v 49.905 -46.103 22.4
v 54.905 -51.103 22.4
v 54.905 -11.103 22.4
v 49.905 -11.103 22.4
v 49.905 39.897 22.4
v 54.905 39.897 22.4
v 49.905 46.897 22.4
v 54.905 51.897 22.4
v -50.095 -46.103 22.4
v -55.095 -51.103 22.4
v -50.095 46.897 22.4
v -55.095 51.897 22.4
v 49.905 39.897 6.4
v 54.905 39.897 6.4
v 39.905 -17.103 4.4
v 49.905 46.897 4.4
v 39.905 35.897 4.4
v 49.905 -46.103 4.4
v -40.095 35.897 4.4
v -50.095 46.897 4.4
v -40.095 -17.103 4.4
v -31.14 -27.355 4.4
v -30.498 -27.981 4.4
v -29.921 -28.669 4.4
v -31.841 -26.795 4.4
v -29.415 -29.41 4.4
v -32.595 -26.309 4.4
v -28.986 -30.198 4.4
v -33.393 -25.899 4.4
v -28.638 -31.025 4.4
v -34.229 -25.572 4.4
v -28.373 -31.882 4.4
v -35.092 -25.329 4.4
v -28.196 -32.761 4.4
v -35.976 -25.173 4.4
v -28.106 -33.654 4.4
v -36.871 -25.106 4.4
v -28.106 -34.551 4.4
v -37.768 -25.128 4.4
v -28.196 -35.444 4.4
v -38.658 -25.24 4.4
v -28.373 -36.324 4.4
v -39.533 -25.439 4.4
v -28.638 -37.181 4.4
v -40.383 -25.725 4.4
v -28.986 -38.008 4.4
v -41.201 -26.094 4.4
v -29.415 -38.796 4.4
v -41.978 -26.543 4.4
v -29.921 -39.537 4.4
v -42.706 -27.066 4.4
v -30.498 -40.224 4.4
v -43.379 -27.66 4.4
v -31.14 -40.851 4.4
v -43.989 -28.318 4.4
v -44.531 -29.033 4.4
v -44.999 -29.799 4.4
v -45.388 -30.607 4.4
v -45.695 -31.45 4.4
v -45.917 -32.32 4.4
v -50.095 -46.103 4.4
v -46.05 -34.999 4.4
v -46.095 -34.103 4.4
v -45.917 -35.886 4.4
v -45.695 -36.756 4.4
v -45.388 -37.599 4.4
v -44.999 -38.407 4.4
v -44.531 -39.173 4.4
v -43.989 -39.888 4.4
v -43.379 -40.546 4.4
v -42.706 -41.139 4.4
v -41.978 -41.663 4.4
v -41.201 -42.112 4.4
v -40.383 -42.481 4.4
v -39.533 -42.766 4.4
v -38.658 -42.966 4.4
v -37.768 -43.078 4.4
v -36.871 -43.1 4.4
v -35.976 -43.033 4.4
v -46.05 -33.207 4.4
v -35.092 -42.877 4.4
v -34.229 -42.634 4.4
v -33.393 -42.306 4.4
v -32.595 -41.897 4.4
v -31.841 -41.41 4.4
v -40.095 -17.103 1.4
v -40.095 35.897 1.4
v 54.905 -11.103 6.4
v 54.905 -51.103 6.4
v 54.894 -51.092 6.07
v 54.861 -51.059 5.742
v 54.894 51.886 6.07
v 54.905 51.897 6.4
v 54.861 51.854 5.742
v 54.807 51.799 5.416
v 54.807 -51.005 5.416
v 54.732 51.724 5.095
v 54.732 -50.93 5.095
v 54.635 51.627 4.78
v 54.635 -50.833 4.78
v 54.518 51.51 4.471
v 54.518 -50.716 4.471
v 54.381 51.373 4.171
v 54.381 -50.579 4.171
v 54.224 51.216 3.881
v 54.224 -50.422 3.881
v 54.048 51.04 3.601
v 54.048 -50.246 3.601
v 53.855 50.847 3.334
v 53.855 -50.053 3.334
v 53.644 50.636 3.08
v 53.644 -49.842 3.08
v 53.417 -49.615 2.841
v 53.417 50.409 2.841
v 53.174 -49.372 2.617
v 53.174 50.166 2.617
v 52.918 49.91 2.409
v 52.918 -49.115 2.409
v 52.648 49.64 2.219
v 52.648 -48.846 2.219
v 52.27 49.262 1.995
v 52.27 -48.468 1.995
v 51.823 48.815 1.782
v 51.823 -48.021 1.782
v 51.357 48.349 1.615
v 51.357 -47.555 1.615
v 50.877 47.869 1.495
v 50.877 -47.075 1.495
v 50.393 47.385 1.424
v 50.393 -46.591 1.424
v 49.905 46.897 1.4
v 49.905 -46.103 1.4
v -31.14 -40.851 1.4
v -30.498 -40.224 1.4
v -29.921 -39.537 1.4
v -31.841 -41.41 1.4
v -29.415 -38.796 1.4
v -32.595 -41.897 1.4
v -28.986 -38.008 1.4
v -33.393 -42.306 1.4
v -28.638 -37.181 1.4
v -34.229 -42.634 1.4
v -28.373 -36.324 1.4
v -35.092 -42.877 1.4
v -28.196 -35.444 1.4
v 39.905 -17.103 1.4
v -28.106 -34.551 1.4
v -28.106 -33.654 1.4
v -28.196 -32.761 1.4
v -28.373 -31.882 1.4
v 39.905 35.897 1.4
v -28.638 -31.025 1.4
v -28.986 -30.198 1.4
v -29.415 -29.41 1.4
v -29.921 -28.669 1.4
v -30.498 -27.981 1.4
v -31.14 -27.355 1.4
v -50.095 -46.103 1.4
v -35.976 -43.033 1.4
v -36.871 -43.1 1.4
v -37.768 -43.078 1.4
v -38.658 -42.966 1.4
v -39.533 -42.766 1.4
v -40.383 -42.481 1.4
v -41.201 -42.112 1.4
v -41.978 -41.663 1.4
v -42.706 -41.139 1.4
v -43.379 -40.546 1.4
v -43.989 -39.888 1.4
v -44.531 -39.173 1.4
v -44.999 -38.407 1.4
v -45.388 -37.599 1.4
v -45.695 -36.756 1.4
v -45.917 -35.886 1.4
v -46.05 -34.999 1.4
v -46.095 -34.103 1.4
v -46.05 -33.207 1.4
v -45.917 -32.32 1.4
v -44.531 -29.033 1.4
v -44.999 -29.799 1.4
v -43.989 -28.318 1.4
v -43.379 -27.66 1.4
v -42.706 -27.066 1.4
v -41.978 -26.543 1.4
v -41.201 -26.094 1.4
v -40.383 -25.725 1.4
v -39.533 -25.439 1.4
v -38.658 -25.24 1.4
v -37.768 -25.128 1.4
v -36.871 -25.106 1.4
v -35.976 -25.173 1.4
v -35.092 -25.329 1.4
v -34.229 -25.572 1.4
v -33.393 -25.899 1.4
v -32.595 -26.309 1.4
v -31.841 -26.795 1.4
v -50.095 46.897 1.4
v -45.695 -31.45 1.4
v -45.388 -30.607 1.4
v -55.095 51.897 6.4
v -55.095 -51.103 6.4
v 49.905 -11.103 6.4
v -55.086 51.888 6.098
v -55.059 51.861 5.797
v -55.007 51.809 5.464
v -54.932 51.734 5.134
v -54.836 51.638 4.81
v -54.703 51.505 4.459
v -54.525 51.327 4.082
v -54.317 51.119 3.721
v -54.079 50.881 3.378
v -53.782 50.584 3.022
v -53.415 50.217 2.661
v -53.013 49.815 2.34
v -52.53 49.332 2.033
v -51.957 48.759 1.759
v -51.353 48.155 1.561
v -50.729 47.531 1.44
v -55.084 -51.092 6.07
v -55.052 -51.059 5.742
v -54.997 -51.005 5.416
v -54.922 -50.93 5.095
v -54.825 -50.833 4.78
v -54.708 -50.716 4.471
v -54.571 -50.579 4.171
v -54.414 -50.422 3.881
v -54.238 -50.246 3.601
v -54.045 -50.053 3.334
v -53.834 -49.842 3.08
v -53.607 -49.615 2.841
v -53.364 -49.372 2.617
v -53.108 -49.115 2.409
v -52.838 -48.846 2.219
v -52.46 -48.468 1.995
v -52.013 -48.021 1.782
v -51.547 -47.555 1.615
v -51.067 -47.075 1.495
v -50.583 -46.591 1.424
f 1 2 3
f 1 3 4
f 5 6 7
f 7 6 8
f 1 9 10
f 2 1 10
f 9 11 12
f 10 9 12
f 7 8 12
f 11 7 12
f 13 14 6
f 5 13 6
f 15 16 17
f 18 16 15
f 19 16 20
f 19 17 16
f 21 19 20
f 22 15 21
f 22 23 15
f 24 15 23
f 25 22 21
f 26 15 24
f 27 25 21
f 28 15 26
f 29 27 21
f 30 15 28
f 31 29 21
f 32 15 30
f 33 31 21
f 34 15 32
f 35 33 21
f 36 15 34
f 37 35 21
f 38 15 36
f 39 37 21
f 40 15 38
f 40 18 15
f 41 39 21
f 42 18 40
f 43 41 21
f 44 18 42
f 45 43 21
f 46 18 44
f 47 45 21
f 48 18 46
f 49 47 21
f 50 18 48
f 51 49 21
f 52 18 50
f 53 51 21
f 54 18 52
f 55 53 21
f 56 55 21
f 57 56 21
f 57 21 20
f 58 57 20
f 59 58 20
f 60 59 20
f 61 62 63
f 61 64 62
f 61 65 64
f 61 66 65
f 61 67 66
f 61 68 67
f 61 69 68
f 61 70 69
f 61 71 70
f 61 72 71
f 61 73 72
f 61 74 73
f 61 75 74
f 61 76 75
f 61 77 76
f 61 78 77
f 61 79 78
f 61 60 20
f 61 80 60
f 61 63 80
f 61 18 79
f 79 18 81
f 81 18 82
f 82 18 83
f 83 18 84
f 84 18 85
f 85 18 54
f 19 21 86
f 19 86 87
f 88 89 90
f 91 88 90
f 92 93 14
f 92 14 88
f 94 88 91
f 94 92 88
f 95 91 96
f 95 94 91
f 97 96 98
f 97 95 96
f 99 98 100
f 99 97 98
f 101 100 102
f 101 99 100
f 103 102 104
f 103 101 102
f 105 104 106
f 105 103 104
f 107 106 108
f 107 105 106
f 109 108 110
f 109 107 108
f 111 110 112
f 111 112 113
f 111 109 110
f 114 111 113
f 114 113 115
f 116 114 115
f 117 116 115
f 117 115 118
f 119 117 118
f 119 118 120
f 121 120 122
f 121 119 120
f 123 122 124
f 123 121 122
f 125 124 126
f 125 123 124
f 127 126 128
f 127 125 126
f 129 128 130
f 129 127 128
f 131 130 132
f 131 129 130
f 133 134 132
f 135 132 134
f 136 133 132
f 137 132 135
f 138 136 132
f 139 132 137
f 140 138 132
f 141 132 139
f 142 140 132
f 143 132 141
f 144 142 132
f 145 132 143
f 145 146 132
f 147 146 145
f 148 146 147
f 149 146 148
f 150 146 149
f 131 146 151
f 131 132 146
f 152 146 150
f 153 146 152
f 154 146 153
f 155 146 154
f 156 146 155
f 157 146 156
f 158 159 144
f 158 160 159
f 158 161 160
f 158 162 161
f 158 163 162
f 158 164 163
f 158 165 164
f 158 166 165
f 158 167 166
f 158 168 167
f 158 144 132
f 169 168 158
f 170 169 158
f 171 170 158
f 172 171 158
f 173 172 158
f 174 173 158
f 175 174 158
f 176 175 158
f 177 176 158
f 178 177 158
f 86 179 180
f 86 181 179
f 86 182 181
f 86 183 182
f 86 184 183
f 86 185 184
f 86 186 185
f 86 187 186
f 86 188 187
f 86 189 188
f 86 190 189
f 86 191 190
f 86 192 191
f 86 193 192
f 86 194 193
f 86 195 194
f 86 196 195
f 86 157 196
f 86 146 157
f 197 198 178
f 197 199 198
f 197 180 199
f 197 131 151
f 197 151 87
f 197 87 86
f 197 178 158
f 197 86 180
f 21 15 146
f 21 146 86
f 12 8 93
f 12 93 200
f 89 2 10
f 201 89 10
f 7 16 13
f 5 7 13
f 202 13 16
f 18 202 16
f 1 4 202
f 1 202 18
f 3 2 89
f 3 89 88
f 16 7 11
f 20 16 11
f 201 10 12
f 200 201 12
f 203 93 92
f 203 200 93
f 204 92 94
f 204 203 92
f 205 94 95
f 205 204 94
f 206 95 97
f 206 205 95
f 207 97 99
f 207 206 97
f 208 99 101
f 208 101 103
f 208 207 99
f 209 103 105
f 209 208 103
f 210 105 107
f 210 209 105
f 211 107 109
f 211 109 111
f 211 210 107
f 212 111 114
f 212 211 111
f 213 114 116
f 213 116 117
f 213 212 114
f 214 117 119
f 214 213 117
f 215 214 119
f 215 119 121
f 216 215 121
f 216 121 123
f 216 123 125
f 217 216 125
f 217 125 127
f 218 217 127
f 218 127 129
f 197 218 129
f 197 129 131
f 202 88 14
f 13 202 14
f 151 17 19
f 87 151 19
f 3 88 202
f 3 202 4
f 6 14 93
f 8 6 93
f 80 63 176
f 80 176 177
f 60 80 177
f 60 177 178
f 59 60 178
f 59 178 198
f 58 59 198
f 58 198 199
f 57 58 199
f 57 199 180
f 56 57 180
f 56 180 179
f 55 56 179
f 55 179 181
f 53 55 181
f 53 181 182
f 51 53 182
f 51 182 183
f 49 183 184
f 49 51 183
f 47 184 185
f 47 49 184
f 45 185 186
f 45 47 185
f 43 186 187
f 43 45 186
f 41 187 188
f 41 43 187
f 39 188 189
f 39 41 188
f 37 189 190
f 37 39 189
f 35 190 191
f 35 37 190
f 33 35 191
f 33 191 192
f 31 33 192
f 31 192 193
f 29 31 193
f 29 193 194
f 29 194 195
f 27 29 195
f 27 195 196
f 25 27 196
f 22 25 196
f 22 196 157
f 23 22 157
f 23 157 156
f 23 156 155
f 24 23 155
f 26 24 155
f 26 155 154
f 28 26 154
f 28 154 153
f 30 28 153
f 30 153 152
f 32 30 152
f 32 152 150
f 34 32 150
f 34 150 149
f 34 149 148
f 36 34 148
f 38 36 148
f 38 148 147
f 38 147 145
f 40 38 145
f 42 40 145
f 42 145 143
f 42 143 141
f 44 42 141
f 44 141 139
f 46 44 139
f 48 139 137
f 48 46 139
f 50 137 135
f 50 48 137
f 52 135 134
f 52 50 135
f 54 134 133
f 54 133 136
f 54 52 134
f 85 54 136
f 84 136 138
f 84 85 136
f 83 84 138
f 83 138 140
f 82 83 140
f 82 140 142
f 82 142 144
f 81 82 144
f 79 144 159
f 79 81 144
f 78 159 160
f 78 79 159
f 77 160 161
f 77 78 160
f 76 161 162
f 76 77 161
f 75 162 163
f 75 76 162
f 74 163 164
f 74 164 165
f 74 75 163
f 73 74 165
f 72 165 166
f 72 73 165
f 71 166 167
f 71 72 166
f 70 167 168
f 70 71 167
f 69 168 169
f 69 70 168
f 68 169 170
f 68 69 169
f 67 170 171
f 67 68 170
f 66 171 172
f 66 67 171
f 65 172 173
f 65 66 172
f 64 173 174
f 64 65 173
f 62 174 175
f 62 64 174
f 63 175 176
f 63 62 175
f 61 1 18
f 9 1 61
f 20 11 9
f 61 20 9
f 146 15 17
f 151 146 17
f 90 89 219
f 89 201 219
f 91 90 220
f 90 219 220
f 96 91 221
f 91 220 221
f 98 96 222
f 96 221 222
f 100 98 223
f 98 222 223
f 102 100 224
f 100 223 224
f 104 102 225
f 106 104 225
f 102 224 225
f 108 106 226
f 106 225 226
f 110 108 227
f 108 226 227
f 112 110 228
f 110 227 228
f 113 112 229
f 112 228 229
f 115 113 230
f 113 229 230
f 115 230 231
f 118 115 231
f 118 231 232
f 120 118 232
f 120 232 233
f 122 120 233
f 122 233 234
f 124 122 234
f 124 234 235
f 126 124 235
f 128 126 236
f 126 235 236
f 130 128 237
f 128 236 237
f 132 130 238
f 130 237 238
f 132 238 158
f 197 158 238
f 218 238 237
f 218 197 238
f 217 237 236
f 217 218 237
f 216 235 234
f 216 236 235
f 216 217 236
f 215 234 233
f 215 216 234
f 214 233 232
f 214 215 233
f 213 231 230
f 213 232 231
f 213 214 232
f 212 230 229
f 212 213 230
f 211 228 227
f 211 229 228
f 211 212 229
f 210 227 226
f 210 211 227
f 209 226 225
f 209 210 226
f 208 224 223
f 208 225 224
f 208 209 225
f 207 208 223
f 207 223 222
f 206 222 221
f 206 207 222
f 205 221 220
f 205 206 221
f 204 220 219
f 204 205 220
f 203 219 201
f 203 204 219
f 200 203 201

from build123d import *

# Parameters (mm, degrees)
F0_W      = 110
F0_H      = 103
F0_R      = 9
F0_W_2    = 80
F0_H_2    = 53
F1_DEPTH  = 21
F2_W      = 100
F2_H      = 93
F2_W_2    = 80
F2_H_2    = 53
F2_R      = 9
F3_DEPTH  = 18
F4_R      = 5
F5_ANGLE  = 180
F7_W      = 51
F7_H      = 16
F3_FACE_W = 93
F3_FACE_H = 18
F8_DEPTH  = 25


with BuildPart() as f1:
    # F0 (on Top) → F1 (new body)
    with BuildSketch(Plane.XY):
        with Locations((-8.2950558215, 3.6971443333)):
            Rectangle(F0_W, F0_H)
        with Locations((28.7049441785, -30.8028556667)):
            Circle(F0_R, mode=Mode.SUBTRACT)
        with Locations((-8.2950558215, 12.6971443333)):
            Rectangle(F0_W_2, F0_H_2, mode=Mode.SUBTRACT)
    extrude(amount=F1_DEPTH)

    # F2 (on face) → F3 (cut)
    with BuildSketch(Plane(origin=(0, 0, 0), x_dir=(1, 0, 0), z_dir=(0, 0, -1))):
        with Locations((-8.2950558215, -3.6971443333)):
            Rectangle(F2_W, F2_H)
        with Locations((-8.2950558215, -12.6971443333)):
            Rectangle(F2_W_2, F2_H_2, mode=Mode.SUBTRACT)
        with Locations((28.7049441785, 30.8028556667)):
            Circle(F2_R, mode=Mode.SUBTRACT)
    extrude(amount=-F3_DEPTH, mode=Mode.SUBTRACT)

    # F4
    f4_edges = [f1.edges().sort_by_distance(p)[0] for p in [
        (-8.295056, -47.802856, 21),
        (46.704944, 3.697144, 21),
        (-8.295056, 55.197144, 21),
        (-63.295056, 3.697144, 21),
    ]]
    fillet(f4_edges, radius=F4_R)


with BuildPart() as f1_1:
    # F5: moved
    add(f1.part.rotate(Axis((46.7049441785, 3.6971443333, 0), (0, 1, 0)), F5_ANGLE))


with BuildPart() as f1_2:
    # F6: moved
    add(f1_1.part.moved(Location((-101.8, -3.3, 22.4))))

    # F7 (on face) + F3_face (on face) → F8 (cut)
    with BuildSketch(Plane.YZ.offset(54.9049441785)):
        with Locations((14.3971443333, 14.4)):
            Rectangle(F7_W, F7_H)
    with BuildSketch(Plane(origin=(49.9049441785, 0.3971443333, 13.4), x_dir=(0, -1, 0), z_dir=(-1, 0, 0))):
        Rectangle(F3_FACE_W, F3_FACE_H)
    extrude(amount=-F8_DEPTH, dir=(1, 0, 0), mode=Mode.SUBTRACT)


solid = f1_2.part
